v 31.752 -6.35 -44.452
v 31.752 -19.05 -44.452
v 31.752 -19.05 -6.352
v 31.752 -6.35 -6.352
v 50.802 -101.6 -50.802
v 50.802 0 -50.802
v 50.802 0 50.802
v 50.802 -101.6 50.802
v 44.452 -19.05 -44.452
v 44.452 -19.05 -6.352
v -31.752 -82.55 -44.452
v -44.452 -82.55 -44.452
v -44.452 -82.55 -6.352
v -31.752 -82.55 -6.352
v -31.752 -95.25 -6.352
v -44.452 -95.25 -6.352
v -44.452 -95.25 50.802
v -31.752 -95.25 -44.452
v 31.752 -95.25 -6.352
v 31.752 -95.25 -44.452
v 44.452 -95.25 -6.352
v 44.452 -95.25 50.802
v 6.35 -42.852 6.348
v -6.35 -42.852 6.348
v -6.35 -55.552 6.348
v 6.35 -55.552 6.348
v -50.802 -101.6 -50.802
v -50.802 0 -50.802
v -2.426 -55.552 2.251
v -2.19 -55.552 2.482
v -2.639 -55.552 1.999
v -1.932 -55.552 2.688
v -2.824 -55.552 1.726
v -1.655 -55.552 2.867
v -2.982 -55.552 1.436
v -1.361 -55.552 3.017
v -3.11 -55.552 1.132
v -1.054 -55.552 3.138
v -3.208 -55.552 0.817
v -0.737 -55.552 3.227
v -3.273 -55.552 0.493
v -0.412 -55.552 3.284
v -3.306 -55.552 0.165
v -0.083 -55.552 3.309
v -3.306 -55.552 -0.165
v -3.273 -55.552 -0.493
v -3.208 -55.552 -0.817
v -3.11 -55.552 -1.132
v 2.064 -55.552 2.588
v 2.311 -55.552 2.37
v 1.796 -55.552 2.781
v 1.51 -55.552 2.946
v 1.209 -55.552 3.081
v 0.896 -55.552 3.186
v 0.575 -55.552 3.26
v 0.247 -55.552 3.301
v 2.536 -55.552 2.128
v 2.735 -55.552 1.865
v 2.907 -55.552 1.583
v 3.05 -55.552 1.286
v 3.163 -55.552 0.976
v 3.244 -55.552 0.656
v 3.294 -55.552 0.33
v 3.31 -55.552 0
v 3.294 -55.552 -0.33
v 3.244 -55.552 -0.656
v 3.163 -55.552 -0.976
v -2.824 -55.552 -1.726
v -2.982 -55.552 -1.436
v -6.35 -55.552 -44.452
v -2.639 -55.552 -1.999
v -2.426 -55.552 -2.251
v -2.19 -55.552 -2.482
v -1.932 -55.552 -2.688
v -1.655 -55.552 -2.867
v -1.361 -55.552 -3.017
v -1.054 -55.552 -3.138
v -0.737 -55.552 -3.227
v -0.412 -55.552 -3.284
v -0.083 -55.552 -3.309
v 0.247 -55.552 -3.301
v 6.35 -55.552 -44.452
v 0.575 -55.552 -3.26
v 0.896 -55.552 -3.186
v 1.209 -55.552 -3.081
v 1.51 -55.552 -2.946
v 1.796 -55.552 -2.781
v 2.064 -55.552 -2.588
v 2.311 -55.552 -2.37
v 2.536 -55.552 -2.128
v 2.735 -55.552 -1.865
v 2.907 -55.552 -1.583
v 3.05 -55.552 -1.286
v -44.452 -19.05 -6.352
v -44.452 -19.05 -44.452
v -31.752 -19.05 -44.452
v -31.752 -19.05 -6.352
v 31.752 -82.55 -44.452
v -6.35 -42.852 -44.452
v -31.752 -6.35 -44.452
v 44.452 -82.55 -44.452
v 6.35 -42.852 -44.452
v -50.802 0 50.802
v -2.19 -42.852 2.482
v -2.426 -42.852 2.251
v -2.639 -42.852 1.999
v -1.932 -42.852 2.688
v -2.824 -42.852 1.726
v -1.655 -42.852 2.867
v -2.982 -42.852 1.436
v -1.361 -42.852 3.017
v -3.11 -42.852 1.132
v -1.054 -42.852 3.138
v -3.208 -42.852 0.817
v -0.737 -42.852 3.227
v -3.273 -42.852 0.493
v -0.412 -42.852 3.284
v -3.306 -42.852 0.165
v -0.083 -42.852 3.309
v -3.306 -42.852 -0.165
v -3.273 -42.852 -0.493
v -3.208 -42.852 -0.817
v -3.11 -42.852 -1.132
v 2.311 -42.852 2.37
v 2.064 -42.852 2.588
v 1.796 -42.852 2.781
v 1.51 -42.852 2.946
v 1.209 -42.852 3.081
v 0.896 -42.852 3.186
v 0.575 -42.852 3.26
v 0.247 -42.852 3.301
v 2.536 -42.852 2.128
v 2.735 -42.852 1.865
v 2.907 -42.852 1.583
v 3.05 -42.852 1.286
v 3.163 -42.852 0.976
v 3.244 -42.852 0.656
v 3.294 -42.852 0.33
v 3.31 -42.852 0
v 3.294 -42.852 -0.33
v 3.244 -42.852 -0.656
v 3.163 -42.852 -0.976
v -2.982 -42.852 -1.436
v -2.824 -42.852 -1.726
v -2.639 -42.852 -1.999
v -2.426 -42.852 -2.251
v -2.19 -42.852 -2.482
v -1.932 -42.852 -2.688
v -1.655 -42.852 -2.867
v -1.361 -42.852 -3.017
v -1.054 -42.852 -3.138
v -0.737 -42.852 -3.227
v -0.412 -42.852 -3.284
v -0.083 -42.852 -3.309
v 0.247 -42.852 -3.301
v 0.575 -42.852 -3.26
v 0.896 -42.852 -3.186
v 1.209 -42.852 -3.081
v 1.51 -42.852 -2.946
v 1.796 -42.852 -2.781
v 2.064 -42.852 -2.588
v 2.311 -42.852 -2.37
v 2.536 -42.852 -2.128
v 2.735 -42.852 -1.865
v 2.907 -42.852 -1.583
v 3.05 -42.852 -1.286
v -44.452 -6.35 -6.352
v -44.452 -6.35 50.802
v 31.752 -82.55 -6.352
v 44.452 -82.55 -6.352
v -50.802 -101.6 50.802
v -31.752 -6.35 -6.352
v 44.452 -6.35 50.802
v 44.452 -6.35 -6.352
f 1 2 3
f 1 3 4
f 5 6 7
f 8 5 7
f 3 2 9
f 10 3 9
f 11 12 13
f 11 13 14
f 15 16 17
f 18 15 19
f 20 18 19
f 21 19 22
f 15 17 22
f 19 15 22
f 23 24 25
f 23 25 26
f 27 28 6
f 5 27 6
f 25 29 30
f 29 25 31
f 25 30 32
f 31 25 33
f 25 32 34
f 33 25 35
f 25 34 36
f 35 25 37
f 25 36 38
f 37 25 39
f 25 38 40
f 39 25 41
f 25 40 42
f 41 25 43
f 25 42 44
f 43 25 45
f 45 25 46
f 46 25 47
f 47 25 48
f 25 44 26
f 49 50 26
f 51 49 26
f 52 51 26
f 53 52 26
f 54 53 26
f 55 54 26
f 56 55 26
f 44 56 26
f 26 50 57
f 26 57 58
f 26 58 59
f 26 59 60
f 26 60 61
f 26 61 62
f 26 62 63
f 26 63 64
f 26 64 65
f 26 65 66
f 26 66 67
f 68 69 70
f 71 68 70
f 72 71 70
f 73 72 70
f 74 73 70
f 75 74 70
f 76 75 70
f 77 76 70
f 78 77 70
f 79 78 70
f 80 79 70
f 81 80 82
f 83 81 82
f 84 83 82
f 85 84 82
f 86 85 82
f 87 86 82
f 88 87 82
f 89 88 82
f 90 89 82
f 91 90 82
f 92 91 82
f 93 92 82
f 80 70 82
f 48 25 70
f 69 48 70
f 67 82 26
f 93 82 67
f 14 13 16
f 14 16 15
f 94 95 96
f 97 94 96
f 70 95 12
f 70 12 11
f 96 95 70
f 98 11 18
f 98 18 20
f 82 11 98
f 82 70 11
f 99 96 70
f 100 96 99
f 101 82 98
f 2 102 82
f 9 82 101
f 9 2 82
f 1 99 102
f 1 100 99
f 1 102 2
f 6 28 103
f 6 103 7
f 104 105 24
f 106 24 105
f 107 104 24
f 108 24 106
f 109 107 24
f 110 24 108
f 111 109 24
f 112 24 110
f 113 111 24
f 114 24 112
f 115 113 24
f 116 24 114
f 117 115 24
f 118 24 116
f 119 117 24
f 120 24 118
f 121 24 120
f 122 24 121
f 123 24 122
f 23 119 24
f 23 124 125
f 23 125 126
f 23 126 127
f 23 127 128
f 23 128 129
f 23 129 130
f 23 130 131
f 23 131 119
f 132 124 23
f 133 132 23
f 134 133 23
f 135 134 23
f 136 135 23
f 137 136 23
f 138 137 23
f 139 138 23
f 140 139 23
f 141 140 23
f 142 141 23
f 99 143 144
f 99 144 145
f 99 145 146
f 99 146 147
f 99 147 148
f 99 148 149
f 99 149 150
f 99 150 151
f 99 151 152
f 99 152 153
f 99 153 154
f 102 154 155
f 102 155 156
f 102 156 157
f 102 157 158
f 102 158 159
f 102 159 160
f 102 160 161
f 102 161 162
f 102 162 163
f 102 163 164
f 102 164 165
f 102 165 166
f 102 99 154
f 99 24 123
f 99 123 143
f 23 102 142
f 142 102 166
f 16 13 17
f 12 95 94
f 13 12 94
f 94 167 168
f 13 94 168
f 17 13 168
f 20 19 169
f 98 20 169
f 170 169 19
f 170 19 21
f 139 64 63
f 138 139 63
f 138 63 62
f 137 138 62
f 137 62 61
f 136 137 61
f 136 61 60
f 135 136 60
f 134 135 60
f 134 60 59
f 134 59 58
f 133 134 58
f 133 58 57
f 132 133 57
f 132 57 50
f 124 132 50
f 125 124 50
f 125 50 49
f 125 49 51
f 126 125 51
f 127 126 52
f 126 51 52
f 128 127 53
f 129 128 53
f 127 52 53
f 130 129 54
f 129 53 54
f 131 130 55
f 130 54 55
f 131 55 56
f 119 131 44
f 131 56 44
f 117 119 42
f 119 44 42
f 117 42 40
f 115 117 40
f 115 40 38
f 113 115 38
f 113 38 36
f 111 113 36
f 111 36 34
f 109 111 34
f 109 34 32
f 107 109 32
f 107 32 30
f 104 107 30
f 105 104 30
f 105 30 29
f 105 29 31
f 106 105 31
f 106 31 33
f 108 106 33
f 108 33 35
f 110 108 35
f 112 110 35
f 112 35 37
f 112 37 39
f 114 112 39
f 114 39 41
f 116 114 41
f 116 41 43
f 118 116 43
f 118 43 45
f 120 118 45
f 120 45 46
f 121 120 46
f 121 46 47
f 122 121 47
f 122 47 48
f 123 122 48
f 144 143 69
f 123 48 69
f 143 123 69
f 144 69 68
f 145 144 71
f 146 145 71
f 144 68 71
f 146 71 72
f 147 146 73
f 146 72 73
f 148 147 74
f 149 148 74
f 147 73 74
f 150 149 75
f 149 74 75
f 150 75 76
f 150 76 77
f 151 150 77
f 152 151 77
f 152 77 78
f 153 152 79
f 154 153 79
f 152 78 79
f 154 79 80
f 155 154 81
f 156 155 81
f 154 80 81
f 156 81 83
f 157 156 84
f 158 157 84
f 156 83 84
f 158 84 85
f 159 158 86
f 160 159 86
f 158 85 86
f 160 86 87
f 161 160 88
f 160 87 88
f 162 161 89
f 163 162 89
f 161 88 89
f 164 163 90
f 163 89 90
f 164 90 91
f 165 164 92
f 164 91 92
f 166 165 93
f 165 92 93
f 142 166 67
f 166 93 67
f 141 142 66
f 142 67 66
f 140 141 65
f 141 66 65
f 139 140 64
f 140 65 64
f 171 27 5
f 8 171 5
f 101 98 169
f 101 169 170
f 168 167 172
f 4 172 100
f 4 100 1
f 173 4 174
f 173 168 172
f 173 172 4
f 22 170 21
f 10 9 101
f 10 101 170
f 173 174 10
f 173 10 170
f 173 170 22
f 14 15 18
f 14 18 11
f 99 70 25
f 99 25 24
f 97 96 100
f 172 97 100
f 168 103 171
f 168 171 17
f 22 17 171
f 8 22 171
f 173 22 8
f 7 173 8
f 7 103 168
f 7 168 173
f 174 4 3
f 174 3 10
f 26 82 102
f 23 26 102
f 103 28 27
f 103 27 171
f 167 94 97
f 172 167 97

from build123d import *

# Parameters (mm, degrees)
F0_W      = 101.603322
F0_H      = 101.60333
F1_DEPTH  = 101.6
F2_T      = -6.35
F3_W      = 12.7
F3_H      = 12.7
F4_DEPTH  = 38.1
F5_W      = 12.7
F5_H      = 12.7
F6_DEPTH  = 38.1
F7_W      = 12.7
F7_H      = 12.7
F8_DEPTH  = 38.1
F9_W      = 12.7
F9_H      = 12.7
F10_DEPTH = 38.1
F11_W     = 12.7
F11_H     = 12.7
F12_DEPTH = 50.8
F13_R     = 3.310042
F14_DEPTH = 25.4


with BuildPart() as f1:
    # F0 (on Front) → F1 (new body)
    with BuildSketch(Plane.XZ):
        Rectangle(F0_W, F0_H)
    extrude(amount=F1_DEPTH)

    # F2
    f2_openings = [f1.faces().sort_by_distance(p)[0] for p in [
        (0, -50.8, 50.801665),
    ]]
    offset(amount=F2_T, openings=f2_openings)

    # F3 (on face) → F4 (join)
    with BuildSketch(Plane.XY.offset(-44.451665)):
        with Locations((-38.101661, -12.7)):
            Rectangle(F3_W, F3_H)
    extrude(amount=F4_DEPTH)

    # F5 (on face) → F6 (join)
    with BuildSketch(Plane.XY.offset(-44.451665)):
        with Locations((38.101661, -12.7)):
            Rectangle(F5_W, F5_H)
    extrude(amount=F6_DEPTH)

    # F7 (on face) → F8 (join)
    with BuildSketch(Plane.XY.offset(-44.451665)):
        with Locations((-38.101661, -88.9)):
            Rectangle(F7_W, F7_H)
    extrude(amount=F8_DEPTH)

    # F9 (on face) → F10 (join)
    with BuildSketch(Plane.XY.offset(-44.451665)):
        with Locations((38.101661, -88.9)):
            Rectangle(F9_W, F9_H)
    extrude(amount=F10_DEPTH)

    # F11 (on face) → F12 (join)
    with BuildSketch(Plane.XY.offset(-44.451665)):
        with Locations((0, -49.202401)):
            Rectangle(F11_W, F11_H)
    extrude(amount=F12_DEPTH)

    # F13 (on face) → F14 (cut)
    with BuildSketch(Plane.XZ.offset(55.552401)):
        Circle(F13_R)
    extrude(amount=-F14_DEPTH, mode=Mode.SUBTRACT)


solid = f1.part
